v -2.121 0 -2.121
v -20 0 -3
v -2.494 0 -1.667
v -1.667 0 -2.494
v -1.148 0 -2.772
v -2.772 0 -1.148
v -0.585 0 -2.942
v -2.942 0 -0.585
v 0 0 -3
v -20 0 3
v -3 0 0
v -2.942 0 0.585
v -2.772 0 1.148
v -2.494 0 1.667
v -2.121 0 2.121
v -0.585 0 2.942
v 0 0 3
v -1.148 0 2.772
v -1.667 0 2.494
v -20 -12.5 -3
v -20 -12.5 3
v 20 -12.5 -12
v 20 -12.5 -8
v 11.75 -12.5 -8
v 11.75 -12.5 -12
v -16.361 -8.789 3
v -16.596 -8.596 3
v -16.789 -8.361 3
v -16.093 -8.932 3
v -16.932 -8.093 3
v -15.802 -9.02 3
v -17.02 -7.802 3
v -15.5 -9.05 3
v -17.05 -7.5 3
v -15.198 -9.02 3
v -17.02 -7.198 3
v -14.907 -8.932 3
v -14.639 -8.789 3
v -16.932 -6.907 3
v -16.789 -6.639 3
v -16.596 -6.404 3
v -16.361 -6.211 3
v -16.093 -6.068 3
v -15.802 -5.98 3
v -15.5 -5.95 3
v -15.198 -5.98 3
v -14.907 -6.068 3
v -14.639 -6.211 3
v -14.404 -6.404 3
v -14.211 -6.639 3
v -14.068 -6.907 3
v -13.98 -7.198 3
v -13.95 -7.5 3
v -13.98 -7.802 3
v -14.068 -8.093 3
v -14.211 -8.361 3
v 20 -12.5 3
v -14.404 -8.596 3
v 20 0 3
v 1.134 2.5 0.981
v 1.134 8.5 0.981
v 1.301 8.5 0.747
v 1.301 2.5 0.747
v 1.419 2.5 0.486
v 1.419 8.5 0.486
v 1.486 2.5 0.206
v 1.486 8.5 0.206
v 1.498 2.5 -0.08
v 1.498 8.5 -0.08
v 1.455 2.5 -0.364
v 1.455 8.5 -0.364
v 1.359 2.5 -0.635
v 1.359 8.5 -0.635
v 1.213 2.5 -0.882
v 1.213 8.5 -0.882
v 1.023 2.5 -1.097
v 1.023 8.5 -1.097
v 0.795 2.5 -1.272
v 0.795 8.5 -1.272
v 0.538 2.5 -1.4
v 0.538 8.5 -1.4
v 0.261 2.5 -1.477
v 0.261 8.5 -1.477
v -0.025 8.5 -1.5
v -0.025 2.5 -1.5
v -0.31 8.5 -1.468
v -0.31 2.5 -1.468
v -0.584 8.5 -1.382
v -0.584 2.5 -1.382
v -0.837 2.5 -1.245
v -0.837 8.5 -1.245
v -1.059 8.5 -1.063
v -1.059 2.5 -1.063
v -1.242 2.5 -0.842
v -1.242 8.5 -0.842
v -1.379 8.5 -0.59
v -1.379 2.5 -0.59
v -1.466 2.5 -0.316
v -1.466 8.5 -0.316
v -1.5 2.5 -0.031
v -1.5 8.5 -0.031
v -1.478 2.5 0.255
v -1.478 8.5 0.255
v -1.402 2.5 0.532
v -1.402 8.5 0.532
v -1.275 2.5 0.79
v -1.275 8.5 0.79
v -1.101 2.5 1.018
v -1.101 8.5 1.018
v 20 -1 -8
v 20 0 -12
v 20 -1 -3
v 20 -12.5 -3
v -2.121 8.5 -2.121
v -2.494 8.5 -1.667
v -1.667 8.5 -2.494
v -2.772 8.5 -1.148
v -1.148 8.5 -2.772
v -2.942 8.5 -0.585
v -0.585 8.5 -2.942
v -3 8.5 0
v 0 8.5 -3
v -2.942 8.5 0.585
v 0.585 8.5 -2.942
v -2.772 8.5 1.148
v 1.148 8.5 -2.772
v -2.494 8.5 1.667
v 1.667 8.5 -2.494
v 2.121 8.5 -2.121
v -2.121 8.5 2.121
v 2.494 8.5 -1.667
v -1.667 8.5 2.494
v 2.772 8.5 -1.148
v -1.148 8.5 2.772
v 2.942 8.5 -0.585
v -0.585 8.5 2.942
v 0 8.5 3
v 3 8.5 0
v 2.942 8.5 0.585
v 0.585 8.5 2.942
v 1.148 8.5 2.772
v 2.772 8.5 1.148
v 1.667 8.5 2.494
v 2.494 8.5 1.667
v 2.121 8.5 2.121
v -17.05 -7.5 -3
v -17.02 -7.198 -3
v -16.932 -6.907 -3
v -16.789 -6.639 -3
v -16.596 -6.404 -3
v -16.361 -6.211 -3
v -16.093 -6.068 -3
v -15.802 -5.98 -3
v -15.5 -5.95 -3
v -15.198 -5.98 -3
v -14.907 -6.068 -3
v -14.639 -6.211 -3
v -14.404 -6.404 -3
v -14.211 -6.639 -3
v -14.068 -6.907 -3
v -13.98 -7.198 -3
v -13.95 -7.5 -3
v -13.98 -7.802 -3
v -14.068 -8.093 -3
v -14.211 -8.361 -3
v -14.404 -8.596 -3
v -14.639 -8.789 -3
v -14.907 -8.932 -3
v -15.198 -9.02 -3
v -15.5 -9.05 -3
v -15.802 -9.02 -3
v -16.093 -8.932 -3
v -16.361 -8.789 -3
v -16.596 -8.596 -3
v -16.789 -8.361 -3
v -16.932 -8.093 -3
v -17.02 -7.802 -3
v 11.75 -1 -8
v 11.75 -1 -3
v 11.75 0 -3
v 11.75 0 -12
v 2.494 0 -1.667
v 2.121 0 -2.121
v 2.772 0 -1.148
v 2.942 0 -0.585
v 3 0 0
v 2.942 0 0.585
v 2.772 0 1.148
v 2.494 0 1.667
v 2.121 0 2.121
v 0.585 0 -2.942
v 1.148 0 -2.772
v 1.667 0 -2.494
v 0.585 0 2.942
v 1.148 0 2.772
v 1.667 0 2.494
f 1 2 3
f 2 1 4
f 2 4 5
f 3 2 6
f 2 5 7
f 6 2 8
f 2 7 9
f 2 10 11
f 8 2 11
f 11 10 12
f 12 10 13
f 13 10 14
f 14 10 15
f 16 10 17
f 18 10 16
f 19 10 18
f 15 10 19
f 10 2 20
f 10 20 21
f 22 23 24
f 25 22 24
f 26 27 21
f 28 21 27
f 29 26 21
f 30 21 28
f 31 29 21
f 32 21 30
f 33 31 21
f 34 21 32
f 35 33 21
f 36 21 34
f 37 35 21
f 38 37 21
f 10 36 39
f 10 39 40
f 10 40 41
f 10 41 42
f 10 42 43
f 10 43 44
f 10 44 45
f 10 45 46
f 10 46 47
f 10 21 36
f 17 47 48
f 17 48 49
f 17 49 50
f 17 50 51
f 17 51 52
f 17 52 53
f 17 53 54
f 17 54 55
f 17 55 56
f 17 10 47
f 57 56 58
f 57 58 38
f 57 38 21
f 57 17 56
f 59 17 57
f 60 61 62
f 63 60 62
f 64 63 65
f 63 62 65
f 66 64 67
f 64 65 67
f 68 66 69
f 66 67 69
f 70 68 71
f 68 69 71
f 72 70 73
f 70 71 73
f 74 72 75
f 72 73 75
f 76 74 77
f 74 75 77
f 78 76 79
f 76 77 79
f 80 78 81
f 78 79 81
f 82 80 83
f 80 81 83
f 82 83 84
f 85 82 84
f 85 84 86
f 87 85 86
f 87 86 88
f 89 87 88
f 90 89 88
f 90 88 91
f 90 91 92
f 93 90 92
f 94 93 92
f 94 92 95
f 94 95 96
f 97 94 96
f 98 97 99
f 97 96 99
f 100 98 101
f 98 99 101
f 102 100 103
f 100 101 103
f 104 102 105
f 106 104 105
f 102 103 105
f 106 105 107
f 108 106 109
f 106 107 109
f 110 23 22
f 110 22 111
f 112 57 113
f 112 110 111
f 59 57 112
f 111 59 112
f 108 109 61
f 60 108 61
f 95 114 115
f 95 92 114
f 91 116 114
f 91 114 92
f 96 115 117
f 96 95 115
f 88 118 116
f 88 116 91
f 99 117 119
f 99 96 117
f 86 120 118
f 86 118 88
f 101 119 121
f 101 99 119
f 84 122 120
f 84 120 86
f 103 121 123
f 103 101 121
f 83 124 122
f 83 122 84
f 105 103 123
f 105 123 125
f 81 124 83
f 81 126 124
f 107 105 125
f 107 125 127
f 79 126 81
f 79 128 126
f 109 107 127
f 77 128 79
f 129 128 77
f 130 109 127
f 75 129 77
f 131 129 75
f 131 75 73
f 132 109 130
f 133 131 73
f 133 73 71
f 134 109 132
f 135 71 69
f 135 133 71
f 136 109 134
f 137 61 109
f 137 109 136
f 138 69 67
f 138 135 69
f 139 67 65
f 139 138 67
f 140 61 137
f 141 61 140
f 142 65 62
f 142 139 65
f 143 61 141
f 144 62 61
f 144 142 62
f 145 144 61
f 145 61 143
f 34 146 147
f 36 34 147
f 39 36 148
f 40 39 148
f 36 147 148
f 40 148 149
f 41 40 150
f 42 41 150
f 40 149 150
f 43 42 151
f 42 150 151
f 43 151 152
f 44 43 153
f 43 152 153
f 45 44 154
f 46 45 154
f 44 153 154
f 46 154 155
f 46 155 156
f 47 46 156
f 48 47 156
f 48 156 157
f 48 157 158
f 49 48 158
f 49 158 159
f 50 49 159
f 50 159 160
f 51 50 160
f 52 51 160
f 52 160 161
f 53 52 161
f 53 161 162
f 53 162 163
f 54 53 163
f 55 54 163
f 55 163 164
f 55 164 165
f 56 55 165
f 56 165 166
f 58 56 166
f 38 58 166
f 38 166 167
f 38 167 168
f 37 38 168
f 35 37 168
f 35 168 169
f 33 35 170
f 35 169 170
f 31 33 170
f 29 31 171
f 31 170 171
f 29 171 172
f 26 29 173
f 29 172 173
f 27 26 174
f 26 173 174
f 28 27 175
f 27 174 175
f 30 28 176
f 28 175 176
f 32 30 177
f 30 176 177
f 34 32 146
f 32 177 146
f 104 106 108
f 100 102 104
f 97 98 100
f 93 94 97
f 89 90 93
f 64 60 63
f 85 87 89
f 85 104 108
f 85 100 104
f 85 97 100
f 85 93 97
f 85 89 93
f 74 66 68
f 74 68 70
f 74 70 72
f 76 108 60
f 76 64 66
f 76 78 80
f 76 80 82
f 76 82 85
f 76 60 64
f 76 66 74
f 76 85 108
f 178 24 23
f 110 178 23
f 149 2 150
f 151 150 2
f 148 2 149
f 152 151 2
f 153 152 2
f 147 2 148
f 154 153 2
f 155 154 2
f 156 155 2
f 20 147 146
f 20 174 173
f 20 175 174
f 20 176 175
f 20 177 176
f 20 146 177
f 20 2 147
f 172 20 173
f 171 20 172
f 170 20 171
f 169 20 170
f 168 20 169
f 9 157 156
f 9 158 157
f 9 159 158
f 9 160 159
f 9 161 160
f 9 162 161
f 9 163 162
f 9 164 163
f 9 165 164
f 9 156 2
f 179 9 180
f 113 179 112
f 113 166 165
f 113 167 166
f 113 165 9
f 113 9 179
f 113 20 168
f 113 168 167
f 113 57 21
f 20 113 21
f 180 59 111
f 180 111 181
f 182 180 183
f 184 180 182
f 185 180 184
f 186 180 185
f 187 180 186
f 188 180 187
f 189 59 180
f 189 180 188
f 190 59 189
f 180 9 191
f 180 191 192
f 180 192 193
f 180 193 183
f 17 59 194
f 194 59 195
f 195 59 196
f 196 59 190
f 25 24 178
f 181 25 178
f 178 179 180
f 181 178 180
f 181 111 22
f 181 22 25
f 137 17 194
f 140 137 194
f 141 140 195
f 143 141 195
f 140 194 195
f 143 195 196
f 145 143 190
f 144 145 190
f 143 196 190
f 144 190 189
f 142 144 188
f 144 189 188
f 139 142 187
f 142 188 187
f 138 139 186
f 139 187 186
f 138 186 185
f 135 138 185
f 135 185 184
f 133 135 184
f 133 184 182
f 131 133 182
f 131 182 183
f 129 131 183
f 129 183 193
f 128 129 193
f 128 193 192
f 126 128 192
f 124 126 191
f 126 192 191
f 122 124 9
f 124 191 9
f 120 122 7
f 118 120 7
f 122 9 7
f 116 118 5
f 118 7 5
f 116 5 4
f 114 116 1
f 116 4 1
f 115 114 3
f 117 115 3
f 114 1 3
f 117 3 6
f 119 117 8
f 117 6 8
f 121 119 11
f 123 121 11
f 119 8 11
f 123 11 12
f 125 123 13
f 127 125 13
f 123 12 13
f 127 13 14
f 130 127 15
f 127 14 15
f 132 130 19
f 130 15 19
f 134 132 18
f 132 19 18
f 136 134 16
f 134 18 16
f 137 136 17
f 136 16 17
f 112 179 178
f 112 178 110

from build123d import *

# Parameters (mm, degrees)
SKETCH1_R           = 3
BOSS_EXTRUDE1_DEPTH = 8.5
CUT_EXTRUDE1_DEPTH  = 6
SKETCH3_W           = 40
SKETCH3_H           = 6
BOSS_EXTRUDE2_DEPTH = 12.5
SKETCH4_R           = 1.55
CUT_EXTRUDE2_DEPTH  = 25.336187047
SKETCH6_W           = 8.25
SKETCH6_H           = 12.5
BOSS_EXTRUDE3_DEPTH = 9
SKETCH7_W           = 8.25
SKETCH7_H           = 5
CUT_EXTRUDE3_DEPTH  = 11.5


with BuildPart() as part:
    # Sketch1 → Boss-Extrude1 (new body)
    with BuildSketch(Plane(origin=(0, 0, 0), x_dir=(1, 0, 0), z_dir=(0, 1, 0))):
        with Locations(Location((0, 0, 0), (0, 0, 270))):
            Circle(SKETCH1_R)
    extrude(amount=BOSS_EXTRUDE1_DEPTH)

    # Sketch2 → Cut-Extrude1 (cut)
    with BuildSketch(Plane(origin=(0, 8.5, 0), x_dir=(1, 0, 0), z_dir=(0, 1, 0))):
        with BuildLine():
            Line((-1.101332519, -1.01836471), (1.134429265, -0.981361423))
            ThreePointArc((1.134429265, -0.981361423), (-0.02482256, 1.499794599), (-1.101332519, -1.01836471))
        make_face()
    extrude(amount=-CUT_EXTRUDE1_DEPTH, mode=Mode.SUBTRACT)

    # Sketch3 → Boss-Extrude2 (add)
    with BuildSketch(Plane.XZ):
        Rectangle(SKETCH3_W, SKETCH3_H)
    extrude(amount=BOSS_EXTRUDE2_DEPTH)

    # Sketch4 → Cut-Extrude2 (cut, through all)
    with BuildSketch(Plane(origin=(0, 0, -3), x_dir=(-1, 0, 0), z_dir=(0, 0, -1))):
        with Locations((15.5, -7.5)):
            Circle(SKETCH4_R)
    extrude(amount=-CUT_EXTRUDE2_DEPTH, mode=Mode.SUBTRACT)

    # Sketch6 → Boss-Extrude3 (add)
    with BuildSketch(Plane(origin=(0, 0, -3), x_dir=(-1, 0, 0), z_dir=(0, 0, -1))):
        with Locations((-15.875, -6.25)):
            Rectangle(SKETCH6_W, SKETCH6_H)
    extrude(amount=BOSS_EXTRUDE3_DEPTH)

    # Sketch7 → Cut-Extrude3 (cut)
    with BuildSketch(Plane.XZ.offset(12.5)):
        with Locations((15.875, -5.5)):
            Rectangle(SKETCH7_W, SKETCH7_H)
    extrude(amount=-CUT_EXTRUDE3_DEPTH, mode=Mode.SUBTRACT)


solid = part.part
